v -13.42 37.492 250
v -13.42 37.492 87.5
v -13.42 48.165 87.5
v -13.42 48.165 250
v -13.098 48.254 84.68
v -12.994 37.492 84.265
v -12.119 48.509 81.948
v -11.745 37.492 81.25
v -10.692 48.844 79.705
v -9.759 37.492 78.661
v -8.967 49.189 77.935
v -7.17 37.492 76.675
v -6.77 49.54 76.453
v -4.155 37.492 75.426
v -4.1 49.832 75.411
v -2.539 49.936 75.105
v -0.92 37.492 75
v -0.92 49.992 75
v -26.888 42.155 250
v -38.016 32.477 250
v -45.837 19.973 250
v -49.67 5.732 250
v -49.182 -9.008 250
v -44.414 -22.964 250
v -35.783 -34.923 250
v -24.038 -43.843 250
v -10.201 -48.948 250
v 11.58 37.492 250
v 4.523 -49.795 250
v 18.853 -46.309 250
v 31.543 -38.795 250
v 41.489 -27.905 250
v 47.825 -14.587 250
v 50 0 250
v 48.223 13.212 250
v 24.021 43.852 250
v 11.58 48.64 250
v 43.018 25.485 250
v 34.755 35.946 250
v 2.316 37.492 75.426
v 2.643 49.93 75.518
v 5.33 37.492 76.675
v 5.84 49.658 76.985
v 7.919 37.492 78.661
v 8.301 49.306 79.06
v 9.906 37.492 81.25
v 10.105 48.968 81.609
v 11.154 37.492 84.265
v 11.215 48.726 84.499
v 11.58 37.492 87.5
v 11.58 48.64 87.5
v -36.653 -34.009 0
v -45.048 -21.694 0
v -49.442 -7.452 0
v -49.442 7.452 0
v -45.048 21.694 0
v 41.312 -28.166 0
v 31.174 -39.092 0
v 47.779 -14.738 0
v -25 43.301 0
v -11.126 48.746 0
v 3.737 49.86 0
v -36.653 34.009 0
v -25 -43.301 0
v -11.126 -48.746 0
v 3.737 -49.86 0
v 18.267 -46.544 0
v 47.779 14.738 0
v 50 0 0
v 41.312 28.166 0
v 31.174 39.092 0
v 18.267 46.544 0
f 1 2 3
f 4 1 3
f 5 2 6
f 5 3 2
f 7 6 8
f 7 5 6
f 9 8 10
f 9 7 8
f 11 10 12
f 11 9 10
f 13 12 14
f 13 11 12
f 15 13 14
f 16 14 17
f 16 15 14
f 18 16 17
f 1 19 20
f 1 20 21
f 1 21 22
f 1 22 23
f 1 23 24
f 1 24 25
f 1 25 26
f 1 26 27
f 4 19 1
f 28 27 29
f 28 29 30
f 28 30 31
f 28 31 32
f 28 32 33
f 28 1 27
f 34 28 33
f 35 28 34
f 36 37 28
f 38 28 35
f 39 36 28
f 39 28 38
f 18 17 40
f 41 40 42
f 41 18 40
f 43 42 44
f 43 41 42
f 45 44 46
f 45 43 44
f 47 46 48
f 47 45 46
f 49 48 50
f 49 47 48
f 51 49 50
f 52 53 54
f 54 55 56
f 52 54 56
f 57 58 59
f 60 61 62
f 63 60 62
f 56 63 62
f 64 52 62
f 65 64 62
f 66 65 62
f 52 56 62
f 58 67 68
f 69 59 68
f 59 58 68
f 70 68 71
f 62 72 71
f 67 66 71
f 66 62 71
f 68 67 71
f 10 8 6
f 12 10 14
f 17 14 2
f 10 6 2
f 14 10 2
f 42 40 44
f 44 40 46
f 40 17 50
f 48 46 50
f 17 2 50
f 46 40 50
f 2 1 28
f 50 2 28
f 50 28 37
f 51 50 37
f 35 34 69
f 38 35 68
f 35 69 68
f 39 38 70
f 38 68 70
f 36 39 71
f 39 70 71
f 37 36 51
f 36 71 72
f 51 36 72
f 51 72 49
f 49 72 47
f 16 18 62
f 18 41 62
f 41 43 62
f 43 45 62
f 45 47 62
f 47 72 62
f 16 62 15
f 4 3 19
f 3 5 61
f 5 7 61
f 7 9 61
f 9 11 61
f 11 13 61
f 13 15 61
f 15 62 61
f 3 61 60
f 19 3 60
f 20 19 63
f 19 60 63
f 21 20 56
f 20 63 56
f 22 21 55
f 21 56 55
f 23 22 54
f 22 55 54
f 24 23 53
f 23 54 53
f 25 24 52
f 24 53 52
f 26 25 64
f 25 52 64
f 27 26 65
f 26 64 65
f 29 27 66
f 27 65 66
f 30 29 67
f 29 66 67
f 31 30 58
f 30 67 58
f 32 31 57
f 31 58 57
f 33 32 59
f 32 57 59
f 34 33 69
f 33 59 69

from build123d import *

# Parameters (mm, degrees)
SKETCH1_R           = 50
BOSS_EXTRUDE1_DEPTH = 250
SKETCH2_W           = 25
SKETCH2_H           = 25
CUT_EXTRUDE1_DEPTH  = 175
FILLET1_R           = 12.5
FILLET2_R           = 12.5


with BuildPart() as part:
    # Sketch1 → Boss-Extrude1 (new body)
    with BuildSketch(Plane.XY):
        Circle(SKETCH1_R)
    extrude(amount=BOSS_EXTRUDE1_DEPTH)

    # Sketch2 → Cut-Extrude1 (cut)
    with BuildSketch(Plane.XY.offset(250)):
        with Locations((-0.919686695, 49.991541048)):
            Rectangle(SKETCH2_W, SKETCH2_H)
    extrude(amount=-CUT_EXTRUDE1_DEPTH, mode=Mode.SUBTRACT)

    # Fillet1
    fillet1_edges = [part.edges().sort_by_distance(p)[0] for p in [
        (-13.419686695, 42.828502974, 75),
    ]]
    fillet(fillet1_edges, radius=FILLET1_R)

    # Fillet2
    fillet2_edges = [part.edges().sort_by_distance(p)[0] for p in [
        (11.580313305, 43.066010777, 75),
    ]]
    fillet(fillet2_edges, radius=FILLET2_R - 0.0001)  # a hair under: the kernel refuses the full size


solid = part.part
